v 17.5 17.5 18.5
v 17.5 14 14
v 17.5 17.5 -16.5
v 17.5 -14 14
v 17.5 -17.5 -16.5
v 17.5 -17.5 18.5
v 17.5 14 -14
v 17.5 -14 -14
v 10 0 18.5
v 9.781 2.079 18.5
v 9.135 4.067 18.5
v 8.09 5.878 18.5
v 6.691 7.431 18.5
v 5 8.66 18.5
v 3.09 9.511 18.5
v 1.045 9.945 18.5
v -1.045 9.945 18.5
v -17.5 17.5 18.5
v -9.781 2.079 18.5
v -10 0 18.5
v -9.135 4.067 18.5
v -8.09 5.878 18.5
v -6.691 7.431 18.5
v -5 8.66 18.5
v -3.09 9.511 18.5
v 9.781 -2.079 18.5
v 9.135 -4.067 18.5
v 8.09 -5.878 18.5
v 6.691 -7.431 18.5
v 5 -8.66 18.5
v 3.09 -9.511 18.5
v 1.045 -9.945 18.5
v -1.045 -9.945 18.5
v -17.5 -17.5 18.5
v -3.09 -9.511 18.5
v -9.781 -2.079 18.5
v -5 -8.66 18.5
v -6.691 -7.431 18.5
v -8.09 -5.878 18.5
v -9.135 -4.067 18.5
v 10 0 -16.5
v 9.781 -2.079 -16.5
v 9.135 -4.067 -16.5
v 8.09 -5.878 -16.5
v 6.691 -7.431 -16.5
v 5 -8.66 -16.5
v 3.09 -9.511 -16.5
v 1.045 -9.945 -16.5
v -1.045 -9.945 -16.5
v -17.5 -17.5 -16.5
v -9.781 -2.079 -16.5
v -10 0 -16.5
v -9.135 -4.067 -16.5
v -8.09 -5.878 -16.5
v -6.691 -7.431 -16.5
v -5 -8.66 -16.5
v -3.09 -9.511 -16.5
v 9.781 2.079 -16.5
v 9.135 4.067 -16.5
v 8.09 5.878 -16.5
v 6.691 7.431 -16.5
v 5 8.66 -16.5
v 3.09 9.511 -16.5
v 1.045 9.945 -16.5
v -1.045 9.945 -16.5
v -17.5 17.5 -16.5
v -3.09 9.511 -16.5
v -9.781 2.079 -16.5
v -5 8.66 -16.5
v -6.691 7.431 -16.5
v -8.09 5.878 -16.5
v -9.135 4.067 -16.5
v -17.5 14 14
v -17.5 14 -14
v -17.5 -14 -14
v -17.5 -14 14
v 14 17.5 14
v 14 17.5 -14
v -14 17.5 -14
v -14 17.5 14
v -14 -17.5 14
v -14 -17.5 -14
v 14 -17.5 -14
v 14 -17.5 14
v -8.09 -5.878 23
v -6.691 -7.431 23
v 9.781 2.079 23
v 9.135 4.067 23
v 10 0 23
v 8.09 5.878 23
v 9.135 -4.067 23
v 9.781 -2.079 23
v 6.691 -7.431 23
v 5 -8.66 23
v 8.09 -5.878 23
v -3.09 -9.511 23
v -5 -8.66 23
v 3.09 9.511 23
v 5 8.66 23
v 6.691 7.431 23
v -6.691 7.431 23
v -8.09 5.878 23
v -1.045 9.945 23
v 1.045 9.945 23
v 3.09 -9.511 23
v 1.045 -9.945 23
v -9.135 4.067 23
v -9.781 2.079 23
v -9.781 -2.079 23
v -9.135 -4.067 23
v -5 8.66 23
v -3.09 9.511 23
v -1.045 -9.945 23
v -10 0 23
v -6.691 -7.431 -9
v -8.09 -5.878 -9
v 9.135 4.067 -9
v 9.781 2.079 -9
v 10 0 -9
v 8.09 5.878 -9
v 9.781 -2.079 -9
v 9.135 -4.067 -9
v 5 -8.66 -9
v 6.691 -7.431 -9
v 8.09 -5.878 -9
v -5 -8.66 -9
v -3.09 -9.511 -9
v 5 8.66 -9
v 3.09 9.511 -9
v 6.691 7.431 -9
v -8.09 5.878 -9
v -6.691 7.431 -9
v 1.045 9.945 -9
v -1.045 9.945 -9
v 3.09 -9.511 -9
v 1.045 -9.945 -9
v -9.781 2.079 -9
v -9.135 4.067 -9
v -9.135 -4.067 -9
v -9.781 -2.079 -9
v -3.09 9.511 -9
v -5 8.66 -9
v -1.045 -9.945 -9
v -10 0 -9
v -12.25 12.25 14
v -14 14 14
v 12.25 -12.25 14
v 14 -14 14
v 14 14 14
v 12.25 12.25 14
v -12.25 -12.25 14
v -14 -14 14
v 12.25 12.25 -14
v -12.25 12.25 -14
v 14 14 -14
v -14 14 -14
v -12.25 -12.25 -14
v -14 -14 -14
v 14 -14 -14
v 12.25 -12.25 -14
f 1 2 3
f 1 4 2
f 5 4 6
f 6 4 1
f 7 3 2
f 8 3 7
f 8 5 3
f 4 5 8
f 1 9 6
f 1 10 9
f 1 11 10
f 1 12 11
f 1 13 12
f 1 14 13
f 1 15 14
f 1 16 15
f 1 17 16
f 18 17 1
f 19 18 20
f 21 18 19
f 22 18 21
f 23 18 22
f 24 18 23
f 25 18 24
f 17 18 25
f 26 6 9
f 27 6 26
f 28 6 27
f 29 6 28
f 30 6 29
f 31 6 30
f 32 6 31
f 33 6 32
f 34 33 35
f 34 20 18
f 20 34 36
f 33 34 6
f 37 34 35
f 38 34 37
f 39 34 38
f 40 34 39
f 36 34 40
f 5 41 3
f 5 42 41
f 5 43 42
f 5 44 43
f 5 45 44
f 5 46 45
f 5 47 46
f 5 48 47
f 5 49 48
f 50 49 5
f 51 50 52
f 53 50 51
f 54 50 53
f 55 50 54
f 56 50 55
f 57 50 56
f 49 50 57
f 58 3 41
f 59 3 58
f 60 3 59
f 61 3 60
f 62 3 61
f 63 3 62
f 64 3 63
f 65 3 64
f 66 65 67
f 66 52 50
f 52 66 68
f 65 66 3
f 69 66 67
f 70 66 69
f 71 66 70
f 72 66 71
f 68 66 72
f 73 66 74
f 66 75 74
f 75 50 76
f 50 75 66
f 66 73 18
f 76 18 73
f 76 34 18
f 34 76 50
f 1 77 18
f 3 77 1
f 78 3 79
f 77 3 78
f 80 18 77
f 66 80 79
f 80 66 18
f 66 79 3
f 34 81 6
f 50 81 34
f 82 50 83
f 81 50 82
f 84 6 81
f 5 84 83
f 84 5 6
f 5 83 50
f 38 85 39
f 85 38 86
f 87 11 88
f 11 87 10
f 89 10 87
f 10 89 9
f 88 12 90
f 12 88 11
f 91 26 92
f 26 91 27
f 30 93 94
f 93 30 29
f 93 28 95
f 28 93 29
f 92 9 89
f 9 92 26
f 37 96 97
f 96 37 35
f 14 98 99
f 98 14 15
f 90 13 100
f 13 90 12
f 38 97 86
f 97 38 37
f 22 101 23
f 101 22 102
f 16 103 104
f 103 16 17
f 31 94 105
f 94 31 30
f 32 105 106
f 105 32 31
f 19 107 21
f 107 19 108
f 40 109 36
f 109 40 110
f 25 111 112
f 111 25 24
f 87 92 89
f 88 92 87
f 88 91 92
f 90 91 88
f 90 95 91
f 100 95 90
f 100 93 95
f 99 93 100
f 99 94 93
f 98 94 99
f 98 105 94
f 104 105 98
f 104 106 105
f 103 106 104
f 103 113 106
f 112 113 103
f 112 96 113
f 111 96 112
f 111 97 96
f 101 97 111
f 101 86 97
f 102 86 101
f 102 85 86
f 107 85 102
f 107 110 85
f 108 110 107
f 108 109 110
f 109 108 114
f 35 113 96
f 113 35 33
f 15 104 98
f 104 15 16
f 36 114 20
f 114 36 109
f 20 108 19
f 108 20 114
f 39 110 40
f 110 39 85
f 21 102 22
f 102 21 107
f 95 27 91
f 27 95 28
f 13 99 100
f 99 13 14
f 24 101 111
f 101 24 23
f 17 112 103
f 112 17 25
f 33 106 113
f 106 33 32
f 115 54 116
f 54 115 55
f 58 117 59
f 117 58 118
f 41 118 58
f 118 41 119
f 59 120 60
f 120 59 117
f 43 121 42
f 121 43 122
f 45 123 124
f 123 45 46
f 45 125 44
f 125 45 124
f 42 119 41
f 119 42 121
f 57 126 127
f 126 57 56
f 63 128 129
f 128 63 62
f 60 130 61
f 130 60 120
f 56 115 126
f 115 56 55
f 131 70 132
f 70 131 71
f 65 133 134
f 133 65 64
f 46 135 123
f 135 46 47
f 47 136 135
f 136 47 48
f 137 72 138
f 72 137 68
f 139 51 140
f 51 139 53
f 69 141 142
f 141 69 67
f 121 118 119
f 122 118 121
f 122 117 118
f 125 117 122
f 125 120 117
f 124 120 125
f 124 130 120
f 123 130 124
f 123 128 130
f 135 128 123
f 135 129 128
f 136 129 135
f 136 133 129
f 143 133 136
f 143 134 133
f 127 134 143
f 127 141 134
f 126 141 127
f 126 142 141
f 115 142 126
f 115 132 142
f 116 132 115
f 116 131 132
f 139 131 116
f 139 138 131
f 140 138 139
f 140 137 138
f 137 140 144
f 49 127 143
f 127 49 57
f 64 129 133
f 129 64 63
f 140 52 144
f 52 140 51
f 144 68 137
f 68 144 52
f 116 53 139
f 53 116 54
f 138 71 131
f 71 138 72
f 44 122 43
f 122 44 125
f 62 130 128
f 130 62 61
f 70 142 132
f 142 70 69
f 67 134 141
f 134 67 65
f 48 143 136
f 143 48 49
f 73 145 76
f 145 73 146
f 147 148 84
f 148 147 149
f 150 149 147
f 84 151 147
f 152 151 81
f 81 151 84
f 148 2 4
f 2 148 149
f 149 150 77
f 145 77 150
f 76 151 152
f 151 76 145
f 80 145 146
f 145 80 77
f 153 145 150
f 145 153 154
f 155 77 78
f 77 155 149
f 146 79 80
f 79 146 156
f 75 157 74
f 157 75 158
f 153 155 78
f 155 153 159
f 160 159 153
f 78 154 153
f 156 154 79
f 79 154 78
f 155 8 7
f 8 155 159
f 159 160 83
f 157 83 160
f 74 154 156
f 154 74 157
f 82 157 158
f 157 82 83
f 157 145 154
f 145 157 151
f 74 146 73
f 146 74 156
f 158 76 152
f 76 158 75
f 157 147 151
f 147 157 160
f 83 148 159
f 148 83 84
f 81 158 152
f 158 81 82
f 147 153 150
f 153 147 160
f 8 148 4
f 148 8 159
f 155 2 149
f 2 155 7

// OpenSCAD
// file: modules.scad
offset = [0,8,0];
zoom = [0.8,0.8,1];

module white( filename, text)
{
    translate([0,4,0])   scale(zoom)
    rotate([180,0,-90]) 
    union(){ 
        translate([-14,-6.4,-2.5])   rotate([0,0,90])  linear_extrude(5)  text (text,font="bold",size=3); 
        intersection() 
        {    
            cube([35,35,5],center=true); 
            translate([1.5,0,2.6])   scale([0.14,0.14,-1])surface(file = filename, center = true); 
        } 
    } 

};

module black( filename, text)
{
    translate([0,4,0])   scale(zoom)
    rotate([180,0,-90]) 
    difference() 
    {    
        cube([35,35,5],center=true); 
        translate([1.5,0,2.6])    scale([0.14,0.14,-1]) surface(file = filename, center = true);
        translate([-14,-6.4,-2.5])   rotate([0,0,90])  linear_extrude(6)  text (text,font="bold",size=3);
    } 
}

module shape()
{
    translate([0,8,0])   scale(zoom) rotate([180,0,0]) 
    {
        rotate([0,0,90]) translate([5,0,0])  cube([35,35,5.5],center=true);  
        // use for help
//        linear_extrude(5)  translate([-9,-4,0])   text("B",size=20);
    }
}

module cube_appendix()
{
    difference()
    {
        union()
        {
            translate([0,0,1])
            {
                cube([35,35,35],center=true);
                 translate([0,0,7]) cylinder(r=10,h=30,center=true);
            }
        }
        translate([0,0,-24]) cylinder(r=10,h=30,center=true);
    }
}

module blue_stairs()
{
        union()
        {
            translate([0,0,1])cube([35,35,35],center=true);
            translate([0,0,-20.5])cube([35,35,9],center=true);            
            translate([-4.25,0,-29.5])cube([35-8.5,35,9],center=true);            
            translate([-8.5,0,-29.5-9])cube([35-17,35,9],center=true);            
            translate([-13,0,-29.5-17.5])cube([35-26,35,9],center=true);            

        }
}
// main file
include <modules.scad>

difference()
{
    cube_appendix();
    union() color([0,1,0])
    {
        rotate([90,0,0])
        {
            translate([0,-4,-15])       shape();  
            rotate([0,90,0])   translate([0,-4,-15])              shape();  
            rotate([0,180,0])   translate([0,-4,-15])              shape();  
            rotate([0,270,0])   translate([0,-4,-15])              shape();  
        }
    }
}
